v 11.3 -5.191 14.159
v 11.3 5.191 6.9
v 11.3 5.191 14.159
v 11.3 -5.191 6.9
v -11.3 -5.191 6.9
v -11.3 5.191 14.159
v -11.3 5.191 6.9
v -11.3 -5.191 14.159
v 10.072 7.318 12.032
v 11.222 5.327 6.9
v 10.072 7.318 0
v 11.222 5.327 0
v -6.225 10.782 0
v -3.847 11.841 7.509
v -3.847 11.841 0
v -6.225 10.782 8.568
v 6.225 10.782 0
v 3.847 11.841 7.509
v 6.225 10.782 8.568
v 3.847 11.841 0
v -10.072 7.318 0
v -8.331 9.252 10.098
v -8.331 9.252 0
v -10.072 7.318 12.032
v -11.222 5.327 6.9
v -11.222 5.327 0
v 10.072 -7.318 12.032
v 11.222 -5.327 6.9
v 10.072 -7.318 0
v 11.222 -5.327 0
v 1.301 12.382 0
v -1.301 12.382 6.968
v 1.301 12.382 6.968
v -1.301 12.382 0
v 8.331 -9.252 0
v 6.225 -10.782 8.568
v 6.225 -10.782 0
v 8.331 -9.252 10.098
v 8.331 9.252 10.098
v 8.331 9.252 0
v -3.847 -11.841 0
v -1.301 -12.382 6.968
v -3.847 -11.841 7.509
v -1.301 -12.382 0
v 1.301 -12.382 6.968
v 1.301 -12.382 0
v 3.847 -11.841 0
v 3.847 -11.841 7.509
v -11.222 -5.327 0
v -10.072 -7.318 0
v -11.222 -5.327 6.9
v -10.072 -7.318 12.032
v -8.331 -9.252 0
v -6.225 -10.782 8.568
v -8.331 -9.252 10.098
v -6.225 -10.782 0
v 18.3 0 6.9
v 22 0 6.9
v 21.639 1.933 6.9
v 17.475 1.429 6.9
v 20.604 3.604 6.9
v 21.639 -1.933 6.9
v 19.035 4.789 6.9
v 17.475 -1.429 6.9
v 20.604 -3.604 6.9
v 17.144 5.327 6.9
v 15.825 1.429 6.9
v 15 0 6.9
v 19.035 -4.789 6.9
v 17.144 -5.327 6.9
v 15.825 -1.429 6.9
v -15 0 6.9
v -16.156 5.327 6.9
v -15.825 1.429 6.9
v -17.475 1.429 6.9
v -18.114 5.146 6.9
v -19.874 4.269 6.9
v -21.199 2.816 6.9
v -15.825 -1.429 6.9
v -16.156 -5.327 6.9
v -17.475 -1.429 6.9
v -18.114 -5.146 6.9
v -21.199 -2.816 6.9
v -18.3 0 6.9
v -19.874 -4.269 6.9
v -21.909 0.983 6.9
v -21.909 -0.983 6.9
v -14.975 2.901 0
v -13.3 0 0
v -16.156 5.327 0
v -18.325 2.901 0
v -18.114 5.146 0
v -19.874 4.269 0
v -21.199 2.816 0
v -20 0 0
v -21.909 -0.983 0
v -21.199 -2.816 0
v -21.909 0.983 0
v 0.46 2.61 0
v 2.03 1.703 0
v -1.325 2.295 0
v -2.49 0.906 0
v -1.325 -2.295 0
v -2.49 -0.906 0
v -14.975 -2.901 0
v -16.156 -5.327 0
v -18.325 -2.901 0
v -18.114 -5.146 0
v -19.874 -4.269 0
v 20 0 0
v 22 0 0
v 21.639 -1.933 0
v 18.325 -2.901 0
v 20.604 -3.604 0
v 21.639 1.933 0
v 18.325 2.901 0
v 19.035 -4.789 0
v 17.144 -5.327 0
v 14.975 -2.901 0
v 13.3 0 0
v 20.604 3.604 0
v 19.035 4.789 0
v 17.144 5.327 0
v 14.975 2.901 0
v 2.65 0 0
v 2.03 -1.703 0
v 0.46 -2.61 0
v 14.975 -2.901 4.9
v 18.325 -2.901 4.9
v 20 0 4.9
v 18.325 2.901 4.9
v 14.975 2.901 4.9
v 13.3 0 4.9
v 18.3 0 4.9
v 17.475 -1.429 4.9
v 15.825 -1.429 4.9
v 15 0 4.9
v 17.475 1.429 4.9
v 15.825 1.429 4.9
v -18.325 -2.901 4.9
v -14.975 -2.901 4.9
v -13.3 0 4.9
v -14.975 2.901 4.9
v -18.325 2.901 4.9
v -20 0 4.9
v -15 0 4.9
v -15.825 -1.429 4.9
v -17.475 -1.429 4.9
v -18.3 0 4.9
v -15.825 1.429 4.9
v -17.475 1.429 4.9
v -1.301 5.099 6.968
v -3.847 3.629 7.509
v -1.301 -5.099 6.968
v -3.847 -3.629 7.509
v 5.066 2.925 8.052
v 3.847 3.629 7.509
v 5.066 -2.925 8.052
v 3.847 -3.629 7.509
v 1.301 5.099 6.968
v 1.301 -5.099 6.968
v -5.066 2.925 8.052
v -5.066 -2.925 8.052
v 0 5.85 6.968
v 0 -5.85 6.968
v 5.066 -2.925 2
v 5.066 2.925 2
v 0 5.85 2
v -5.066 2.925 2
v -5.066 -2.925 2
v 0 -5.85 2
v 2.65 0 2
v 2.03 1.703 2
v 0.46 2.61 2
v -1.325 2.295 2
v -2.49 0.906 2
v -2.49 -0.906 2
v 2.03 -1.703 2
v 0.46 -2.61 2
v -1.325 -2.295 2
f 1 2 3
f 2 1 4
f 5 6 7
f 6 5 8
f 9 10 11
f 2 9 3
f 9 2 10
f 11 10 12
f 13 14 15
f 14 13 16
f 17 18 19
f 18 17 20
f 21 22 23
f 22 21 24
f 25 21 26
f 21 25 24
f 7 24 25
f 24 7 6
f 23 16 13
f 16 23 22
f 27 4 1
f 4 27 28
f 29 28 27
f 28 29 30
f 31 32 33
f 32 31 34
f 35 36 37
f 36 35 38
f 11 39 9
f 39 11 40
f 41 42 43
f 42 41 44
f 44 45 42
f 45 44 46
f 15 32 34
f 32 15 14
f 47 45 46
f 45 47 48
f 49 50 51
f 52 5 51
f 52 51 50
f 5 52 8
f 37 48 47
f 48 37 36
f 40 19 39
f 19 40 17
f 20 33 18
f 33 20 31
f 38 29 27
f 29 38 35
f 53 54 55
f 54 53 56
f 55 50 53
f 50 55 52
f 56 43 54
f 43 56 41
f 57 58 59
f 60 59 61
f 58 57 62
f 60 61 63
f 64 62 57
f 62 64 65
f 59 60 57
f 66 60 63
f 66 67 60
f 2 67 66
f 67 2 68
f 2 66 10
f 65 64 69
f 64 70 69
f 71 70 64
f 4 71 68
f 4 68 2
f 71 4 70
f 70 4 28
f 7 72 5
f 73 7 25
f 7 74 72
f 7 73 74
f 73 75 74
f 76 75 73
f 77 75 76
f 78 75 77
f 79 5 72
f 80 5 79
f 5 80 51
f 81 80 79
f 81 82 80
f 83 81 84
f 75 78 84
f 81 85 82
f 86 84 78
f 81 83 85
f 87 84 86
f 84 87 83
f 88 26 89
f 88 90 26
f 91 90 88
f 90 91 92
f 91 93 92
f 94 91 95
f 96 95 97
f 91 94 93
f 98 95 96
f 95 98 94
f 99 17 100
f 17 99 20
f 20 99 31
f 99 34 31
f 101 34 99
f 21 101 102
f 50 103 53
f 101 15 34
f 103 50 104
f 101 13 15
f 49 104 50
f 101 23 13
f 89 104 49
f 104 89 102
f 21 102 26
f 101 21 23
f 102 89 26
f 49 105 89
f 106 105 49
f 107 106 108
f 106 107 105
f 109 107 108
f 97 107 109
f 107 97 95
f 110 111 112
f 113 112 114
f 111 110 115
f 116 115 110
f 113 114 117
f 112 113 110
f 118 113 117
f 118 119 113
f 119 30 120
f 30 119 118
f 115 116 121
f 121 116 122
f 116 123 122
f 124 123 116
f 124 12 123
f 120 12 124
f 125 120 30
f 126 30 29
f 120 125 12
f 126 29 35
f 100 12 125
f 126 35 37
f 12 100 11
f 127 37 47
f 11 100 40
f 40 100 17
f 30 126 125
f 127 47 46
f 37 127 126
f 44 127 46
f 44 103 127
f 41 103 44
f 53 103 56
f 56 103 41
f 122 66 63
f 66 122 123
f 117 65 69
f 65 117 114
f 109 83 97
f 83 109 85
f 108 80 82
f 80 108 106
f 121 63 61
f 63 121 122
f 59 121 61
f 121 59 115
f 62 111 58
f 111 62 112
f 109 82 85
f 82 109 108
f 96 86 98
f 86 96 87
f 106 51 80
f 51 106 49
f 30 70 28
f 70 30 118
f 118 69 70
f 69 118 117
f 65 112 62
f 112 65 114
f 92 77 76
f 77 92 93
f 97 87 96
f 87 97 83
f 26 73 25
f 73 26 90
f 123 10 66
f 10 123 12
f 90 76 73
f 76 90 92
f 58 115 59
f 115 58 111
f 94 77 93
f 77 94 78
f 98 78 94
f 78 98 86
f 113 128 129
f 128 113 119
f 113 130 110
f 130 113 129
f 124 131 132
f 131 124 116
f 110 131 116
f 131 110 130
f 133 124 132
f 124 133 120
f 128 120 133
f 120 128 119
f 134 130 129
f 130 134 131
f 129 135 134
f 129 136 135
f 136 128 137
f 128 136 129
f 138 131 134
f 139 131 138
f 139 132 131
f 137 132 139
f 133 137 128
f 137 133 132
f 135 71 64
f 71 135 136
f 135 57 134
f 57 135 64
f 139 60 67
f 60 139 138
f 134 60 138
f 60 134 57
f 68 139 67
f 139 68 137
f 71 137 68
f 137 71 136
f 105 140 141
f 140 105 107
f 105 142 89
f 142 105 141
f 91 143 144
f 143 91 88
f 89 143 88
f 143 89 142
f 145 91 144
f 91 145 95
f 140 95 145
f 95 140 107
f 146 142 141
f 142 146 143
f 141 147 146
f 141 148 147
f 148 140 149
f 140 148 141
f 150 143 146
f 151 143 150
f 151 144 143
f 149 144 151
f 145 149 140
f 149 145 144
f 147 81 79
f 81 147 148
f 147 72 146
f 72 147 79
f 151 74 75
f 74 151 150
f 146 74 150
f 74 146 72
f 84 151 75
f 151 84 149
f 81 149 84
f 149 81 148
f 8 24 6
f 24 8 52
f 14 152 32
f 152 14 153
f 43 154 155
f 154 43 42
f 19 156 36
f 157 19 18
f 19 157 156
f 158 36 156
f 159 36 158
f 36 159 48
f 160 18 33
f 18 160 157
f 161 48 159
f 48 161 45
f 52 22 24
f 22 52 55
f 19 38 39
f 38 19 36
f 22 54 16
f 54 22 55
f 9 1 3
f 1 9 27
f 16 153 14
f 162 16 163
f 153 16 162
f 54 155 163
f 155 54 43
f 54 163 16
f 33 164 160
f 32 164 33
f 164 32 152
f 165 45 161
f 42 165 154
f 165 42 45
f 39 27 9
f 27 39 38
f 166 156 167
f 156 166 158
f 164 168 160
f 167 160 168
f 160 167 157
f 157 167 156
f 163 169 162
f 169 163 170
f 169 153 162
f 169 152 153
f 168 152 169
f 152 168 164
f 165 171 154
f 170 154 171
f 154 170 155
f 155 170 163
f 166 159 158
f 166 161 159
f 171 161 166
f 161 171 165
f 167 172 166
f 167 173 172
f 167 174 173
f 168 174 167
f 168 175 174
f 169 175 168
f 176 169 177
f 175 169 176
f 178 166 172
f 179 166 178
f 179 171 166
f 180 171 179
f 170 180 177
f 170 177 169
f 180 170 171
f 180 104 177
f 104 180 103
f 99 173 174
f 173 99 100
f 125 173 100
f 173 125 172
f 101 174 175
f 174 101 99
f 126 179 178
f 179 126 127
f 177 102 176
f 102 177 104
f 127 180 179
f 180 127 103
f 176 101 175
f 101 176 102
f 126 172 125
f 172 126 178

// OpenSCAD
diam_torche=24.4+0.5; ray_torche=diam_torche/2;
larg_torche=22.2+0.4;
long_torche=50;

dia0_ecrou0=5+0.3; dia1_ecrou0=11.2+0.5; haut_ecrou0=4.6+0.3;
dia0_ecrou1=3+0.3; dia1_ecrou1=6.2+0.5; haut_ecrou1=3+0.3; // A VERIFIER
deca_ecrou1=2; dia2_ecrou1=dia1_ecrou1+deca_ecrou1*2;

diam_base=diam_torche; ray_base=diam_base/2;
hau0_base=2;
hau1_base=haut_ecrou0+hau0_base;


module Corps_Torche() {
  color("Blue") intersection() {
    cylinder(r=ray_torche,h=long_torche,center=true);
    cube([larg_torche,diam_torche+0.2,long_torche+0.2],center=true);
  }
}


module Base_Support() {
  difference() {
    union() {
      cylinder(r=ray_base,h=hau1_base);
      hull() {
        translate([(larg_torche+dia2_ecrou1)/2,0,0]) cylinder(r=dia2_ecrou1/2,h=hau1_base);
        translate([-(larg_torche+dia2_ecrou1)/2,0,0]) cylinder(r=dia2_ecrou1/2,h=hau1_base);
      }
      translate([0,0,hau1_base-0.1]) intersection() {
        translate([-larg_torche/2,-ray_torche-0.1,0]) cube([larg_torche,diam_torche+0.2,ray_torche]);
        translate([0,0,-0.1]) cylinder(r=ray_torche,h=ray_torche+0.2);
      }
    }
    translate([0,0,ray_torche+hau1_base])
      rotate([90,0,0]) cylinder(r=ray_torche,h=diam_torche+0.2,center=true);
    translate([0,0,hau0_base])
      rotate([0,0,90]) cylinder(r=dia1_ecrou0/2,h=hau1_base,$fn=6);
    translate([0,0,-0.1]) cylinder(r=dia0_ecrou0/2,h=hau1_base);
    translate([(larg_torche+dia2_ecrou1)/2,0,-0.1]) {
      cylinder(r=dia1_ecrou1/2,h=hau1_base-hau0_base+0.1,$fn=6);
      cylinder(r=dia0_ecrou1/2,h=hau1_base+0.2);
    }
    translate([-(larg_torche+dia2_ecrou1)/2,0,-0.1]) {
      cylinder(r=dia1_ecrou1/2,h=hau1_base-hau0_base+0.1,$fn=6);
      cylinder(r=dia0_ecrou1/2,h=hau1_base+0.2);
    }

  }
}

echo(dia2_ecrou1);
Base_Support();
//#translate([0,0,hau1_base+diam_torche/2]) rotate([90,0,0]) Corps_Torche();
